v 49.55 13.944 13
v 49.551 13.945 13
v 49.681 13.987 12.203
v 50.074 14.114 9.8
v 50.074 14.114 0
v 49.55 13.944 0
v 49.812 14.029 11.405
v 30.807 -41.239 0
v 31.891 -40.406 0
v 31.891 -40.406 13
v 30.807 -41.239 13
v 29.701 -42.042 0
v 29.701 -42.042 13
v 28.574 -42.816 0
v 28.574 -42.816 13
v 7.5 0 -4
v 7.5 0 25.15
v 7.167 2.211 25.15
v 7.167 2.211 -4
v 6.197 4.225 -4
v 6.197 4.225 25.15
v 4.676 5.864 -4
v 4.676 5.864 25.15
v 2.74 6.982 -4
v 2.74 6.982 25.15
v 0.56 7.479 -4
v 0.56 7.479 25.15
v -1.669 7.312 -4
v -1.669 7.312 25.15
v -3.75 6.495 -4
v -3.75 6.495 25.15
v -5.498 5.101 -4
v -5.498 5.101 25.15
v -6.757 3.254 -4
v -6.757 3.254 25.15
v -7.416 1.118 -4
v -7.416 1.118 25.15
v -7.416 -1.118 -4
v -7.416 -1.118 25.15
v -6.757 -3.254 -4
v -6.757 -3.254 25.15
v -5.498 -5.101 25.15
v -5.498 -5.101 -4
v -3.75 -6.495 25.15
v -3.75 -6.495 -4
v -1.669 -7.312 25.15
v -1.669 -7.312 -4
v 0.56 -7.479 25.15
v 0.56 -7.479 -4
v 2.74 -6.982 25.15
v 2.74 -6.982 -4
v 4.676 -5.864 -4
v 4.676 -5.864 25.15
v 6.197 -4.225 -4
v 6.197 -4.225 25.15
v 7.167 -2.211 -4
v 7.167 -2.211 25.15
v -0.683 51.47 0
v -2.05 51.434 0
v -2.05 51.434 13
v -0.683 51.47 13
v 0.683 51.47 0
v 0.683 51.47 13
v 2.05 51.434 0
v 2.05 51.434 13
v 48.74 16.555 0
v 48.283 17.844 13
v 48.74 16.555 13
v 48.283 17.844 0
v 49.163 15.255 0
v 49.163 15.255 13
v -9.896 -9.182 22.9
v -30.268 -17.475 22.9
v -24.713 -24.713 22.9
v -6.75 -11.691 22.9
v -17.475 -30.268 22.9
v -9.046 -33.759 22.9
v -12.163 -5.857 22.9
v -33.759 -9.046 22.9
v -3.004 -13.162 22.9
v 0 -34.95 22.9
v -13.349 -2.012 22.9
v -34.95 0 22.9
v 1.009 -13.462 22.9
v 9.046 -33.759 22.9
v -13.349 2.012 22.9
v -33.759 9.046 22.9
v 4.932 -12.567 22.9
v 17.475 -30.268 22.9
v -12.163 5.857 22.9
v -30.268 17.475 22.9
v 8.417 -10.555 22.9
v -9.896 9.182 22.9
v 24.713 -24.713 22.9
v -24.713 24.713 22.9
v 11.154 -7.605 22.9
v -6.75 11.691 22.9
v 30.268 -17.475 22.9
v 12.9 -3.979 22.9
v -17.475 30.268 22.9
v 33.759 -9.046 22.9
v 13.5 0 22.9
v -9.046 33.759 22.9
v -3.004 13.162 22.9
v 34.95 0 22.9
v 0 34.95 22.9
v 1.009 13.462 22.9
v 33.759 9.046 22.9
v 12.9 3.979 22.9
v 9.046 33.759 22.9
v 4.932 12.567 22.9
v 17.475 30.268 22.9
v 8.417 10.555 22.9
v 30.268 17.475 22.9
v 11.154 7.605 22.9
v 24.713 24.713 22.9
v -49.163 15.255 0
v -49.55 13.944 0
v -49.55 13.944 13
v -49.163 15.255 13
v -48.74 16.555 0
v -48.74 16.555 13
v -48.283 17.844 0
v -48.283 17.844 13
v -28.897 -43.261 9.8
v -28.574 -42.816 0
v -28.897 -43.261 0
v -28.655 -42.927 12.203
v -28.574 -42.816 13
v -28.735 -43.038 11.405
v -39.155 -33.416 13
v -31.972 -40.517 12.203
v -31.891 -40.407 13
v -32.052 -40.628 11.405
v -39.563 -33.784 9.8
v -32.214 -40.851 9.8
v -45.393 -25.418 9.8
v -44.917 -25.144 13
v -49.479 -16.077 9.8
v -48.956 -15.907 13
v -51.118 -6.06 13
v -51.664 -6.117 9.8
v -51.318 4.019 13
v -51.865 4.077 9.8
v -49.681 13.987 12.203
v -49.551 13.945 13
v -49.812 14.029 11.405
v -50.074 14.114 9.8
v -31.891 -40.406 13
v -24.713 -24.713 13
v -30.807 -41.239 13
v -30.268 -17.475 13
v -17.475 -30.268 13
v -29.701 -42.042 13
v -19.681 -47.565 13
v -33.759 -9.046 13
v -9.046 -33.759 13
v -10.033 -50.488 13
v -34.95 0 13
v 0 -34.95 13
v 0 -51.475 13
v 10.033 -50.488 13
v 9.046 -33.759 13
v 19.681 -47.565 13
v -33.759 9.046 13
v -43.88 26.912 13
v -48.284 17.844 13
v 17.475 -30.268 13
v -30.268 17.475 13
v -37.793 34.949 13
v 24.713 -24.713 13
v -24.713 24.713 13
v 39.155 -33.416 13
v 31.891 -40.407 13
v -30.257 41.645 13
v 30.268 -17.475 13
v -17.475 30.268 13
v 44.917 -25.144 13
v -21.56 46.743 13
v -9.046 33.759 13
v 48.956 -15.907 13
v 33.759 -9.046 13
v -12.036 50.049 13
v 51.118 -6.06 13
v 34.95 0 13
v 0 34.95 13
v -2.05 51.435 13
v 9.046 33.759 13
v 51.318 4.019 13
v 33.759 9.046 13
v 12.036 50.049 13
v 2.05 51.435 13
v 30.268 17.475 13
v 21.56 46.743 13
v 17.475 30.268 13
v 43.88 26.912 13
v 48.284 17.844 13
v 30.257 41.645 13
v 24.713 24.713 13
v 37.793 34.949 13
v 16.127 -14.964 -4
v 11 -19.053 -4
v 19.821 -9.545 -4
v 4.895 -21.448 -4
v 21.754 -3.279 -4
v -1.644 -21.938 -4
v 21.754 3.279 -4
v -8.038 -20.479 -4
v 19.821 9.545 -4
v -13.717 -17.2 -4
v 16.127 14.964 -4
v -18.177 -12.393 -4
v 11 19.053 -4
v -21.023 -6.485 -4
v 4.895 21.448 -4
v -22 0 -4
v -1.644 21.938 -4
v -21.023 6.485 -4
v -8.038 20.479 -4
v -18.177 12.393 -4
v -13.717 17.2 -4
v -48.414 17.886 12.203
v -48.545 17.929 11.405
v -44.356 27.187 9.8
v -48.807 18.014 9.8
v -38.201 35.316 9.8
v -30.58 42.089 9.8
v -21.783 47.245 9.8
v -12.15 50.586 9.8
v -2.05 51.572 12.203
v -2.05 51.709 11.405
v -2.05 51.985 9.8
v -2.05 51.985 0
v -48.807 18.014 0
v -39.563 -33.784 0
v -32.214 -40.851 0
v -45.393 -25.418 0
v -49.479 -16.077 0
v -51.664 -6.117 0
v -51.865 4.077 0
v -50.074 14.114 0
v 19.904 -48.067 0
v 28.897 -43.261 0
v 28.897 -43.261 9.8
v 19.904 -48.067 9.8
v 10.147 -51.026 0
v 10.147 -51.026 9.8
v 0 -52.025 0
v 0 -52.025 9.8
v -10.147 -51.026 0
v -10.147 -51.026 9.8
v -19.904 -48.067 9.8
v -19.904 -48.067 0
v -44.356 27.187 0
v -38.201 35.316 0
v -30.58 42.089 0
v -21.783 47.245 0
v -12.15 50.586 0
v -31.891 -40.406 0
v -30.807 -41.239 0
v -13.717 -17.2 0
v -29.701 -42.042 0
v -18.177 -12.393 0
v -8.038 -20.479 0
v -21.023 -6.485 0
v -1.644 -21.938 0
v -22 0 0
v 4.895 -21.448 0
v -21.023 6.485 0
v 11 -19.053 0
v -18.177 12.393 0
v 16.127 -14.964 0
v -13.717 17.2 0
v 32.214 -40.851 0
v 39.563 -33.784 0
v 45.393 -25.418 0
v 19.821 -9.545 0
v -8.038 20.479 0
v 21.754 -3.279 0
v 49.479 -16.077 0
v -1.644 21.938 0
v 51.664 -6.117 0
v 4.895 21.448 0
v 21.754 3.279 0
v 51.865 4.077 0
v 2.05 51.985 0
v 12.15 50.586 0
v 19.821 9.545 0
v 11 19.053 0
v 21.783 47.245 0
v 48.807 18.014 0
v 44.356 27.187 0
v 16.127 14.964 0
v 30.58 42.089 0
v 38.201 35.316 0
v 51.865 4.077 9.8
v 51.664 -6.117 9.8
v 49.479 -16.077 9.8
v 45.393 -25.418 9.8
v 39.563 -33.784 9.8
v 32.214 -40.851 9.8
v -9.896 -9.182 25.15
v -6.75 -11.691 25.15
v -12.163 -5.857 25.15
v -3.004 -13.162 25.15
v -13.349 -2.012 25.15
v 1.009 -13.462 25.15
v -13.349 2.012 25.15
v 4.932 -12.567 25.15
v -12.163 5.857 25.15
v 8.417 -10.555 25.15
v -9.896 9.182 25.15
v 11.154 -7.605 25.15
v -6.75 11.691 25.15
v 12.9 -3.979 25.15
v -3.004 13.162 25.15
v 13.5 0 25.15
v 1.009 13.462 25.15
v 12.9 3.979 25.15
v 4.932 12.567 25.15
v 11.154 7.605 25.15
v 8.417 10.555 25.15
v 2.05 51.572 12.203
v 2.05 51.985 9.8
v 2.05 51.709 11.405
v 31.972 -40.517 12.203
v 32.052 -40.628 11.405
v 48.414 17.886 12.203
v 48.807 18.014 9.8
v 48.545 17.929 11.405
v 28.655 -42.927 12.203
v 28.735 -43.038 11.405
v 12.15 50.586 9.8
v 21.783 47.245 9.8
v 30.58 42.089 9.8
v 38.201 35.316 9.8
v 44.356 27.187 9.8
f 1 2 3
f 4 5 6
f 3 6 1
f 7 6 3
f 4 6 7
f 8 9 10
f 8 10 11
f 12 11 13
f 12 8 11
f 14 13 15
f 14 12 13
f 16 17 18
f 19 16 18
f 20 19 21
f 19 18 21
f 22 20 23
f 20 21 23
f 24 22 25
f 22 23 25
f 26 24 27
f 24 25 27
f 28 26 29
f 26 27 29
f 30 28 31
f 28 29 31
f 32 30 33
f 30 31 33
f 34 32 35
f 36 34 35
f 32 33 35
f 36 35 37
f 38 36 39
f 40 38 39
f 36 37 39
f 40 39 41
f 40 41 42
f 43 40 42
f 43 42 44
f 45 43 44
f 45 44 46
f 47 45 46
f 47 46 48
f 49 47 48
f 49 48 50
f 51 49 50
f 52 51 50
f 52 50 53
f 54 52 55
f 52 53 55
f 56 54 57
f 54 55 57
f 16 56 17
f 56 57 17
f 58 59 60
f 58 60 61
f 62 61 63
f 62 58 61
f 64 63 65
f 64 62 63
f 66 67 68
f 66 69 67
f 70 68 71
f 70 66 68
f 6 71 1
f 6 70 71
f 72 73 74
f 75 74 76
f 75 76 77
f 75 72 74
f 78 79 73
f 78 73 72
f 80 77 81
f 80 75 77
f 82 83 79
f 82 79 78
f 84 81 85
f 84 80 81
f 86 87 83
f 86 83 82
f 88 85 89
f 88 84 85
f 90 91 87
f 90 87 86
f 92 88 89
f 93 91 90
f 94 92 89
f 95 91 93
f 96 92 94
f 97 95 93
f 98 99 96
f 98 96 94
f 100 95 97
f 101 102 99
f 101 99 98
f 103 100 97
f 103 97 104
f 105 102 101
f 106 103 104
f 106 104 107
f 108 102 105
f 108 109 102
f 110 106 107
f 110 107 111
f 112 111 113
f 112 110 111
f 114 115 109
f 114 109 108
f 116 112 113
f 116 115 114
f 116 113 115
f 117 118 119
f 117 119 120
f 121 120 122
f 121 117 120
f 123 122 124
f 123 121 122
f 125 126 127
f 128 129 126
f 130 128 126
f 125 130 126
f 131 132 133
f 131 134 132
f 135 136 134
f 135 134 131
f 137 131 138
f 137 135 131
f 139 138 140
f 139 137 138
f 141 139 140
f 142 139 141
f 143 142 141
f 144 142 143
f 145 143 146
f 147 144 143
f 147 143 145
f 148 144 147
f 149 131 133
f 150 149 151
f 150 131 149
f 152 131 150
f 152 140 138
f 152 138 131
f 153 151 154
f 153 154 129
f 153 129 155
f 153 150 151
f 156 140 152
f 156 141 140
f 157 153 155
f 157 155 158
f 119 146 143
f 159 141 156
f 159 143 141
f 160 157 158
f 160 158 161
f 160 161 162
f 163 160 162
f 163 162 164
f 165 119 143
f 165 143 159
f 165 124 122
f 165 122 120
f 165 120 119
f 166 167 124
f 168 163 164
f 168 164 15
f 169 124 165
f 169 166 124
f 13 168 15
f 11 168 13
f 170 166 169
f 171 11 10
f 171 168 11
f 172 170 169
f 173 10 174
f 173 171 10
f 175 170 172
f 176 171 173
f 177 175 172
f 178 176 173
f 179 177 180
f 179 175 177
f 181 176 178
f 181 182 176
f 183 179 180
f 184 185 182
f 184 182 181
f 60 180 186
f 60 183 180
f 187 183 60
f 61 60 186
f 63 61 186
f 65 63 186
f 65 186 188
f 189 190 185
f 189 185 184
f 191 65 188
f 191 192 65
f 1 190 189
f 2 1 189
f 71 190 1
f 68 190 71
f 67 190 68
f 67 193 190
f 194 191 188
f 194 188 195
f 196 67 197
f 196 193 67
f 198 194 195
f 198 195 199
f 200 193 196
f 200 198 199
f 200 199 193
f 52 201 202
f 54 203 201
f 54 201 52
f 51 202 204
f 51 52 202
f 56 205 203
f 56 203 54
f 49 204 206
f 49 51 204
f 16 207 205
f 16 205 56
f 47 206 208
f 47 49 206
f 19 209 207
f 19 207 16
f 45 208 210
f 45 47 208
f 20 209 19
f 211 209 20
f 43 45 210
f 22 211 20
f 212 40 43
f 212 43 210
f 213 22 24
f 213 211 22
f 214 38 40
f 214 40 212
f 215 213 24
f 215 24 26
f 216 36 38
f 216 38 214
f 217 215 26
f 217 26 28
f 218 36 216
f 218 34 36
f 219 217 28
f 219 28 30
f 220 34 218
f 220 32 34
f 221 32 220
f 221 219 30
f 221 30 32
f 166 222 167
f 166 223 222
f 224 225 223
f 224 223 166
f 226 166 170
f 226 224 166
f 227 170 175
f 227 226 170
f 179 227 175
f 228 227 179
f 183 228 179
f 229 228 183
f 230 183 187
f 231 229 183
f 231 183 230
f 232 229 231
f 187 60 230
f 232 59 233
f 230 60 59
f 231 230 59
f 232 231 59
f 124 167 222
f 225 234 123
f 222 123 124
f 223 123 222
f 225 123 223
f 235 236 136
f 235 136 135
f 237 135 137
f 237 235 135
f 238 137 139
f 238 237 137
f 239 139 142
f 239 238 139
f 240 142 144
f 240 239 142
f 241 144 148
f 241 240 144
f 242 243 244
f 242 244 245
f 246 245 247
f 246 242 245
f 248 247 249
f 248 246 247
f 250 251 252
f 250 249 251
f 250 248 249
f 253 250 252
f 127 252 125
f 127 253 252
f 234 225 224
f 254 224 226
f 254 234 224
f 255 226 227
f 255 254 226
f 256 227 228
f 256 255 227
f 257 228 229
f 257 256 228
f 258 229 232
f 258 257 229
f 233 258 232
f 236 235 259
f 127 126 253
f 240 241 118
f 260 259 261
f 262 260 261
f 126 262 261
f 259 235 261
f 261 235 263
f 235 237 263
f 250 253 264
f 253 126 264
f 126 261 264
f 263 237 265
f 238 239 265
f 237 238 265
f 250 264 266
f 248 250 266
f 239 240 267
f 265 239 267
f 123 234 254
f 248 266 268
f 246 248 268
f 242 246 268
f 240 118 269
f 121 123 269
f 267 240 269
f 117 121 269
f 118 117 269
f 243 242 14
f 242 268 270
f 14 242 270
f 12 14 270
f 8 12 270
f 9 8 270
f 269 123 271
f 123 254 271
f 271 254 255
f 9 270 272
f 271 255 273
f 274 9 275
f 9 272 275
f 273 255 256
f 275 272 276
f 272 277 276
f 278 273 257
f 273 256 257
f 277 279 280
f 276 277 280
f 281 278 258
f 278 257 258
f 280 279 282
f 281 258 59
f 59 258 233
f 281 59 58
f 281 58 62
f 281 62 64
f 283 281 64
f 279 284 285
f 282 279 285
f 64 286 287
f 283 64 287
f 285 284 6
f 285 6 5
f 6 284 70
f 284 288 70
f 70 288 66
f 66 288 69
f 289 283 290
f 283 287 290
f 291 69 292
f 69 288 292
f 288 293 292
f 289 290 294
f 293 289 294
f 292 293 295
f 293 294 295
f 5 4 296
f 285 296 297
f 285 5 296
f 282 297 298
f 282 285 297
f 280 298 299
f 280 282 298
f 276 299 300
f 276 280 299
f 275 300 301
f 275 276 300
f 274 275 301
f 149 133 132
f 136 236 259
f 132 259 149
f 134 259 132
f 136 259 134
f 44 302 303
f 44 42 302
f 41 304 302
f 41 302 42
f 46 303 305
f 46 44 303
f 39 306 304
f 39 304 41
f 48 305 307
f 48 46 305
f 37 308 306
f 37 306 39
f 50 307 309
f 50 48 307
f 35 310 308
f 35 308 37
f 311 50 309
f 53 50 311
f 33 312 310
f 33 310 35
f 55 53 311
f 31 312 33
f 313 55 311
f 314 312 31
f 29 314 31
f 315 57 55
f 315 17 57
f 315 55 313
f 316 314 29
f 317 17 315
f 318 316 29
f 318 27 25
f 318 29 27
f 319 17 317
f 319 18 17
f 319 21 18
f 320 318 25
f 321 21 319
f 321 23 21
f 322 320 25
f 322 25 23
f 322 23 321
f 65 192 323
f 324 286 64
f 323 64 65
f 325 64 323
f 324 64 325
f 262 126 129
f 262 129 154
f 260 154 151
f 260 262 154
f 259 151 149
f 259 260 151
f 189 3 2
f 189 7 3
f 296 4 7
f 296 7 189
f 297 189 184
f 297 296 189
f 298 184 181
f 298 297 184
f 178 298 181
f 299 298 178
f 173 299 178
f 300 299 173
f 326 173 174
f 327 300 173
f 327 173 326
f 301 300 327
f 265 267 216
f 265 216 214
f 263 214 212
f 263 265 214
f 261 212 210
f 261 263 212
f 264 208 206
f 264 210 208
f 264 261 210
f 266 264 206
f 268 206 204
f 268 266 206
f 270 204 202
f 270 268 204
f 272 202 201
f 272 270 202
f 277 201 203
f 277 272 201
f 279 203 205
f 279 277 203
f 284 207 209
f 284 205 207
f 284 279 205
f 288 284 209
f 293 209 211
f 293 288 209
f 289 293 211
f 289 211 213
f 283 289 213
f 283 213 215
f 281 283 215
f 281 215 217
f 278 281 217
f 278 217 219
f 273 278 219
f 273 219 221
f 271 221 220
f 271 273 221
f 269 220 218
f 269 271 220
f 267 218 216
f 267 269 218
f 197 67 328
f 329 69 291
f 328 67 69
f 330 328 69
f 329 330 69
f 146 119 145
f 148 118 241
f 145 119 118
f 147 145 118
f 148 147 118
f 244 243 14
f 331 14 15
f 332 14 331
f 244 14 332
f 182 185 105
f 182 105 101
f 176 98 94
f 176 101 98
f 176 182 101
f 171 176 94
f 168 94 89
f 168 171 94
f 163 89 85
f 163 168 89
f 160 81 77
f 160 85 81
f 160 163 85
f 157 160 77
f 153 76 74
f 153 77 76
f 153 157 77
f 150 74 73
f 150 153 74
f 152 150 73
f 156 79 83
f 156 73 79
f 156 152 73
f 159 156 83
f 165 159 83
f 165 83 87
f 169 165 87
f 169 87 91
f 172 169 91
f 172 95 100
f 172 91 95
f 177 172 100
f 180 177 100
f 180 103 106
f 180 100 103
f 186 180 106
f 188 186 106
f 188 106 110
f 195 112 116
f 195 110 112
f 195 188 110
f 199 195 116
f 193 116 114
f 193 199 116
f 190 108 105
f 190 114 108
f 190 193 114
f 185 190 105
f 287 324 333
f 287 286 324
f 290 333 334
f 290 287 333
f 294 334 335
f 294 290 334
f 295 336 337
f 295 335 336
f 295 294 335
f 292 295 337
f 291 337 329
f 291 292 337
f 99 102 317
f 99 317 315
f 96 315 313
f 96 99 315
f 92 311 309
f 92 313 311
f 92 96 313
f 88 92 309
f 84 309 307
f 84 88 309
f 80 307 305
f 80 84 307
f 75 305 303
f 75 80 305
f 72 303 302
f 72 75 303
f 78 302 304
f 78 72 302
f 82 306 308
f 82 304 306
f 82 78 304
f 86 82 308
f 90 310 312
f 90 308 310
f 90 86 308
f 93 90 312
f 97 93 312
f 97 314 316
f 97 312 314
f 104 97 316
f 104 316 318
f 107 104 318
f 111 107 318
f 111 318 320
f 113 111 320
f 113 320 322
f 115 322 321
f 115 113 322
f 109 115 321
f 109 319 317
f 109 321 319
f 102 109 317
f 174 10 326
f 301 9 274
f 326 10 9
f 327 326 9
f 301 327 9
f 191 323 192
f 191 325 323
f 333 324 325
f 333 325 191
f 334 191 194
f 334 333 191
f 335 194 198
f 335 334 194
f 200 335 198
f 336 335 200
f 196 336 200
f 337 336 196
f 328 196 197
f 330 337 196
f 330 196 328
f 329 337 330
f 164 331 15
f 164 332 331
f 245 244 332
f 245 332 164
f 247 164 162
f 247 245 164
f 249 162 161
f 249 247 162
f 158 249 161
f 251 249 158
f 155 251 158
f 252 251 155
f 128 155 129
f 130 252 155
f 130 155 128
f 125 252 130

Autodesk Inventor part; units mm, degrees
ref_plane "YZ Plane" through (0, 0, 0) normal (1, 0, 0) x (0, 1, 0)
ref_plane "XZ Plane" through (0, 0, 0) normal (0, 1, 0) x (-1, 0, 0)
ref_plane "XY Plane" through (0, 0, 0) normal (0, 0, 1) x (1, 0, 0)
sketch "Sketch1" plane through (0, 0, 0) normal (0, 0, 1) x (1, 0, 0)
  circle A0 centre (0, 0) radius 52.025
  line L0 (-2.05, 56.1236) -> (2.05, 56.1236)
  line L1 (2.05, 56.1236) -> (2.05, 48.6562)
  line L2 (2.05, 48.6562) -> (-2.05, 48.6562)
  line L3 (-2.05, 48.6562) -> (-2.05, 56.1236)
  line L4 (0, 0) -> (0, 78.5962)
  circle A1 centre (0, 0) radius 51.475
  line L5 (-54.0102, 15.3935) -> (-52.7433, 19.2928)
  line L6 (-52.7433, 19.2928) -> (-45.6413, 16.9853)
  line L7 (-45.6413, 16.9853) -> (-46.9083, 13.0859)
  line L8 (-46.9083, 13.0859) -> (-54.0102, 15.3935)
  line L9 (-31.3302, -46.6099) -> (-34.6471, -44.2)
  line L10 (-34.6471, -44.2) -> (-30.2579, -38.1587)
  line L11 (-30.2579, -38.1587) -> (-26.9409, -40.5687)
  line L12 (-26.9409, -40.5687) -> (-31.3302, -46.6099)
  line L13 (34.6471, -44.2) -> (31.3302, -46.6099)
  line L14 (31.3302, -46.6099) -> (26.9409, -40.5687)
  line L15 (26.9409, -40.5687) -> (30.2579, -38.1587)
  line L16 (30.2579, -38.1587) -> (34.6471, -44.2)
  line L17 (52.7433, 19.2928) -> (54.0102, 15.3935)
  line L18 (54.0102, 15.3935) -> (46.9083, 13.0859)
  line L19 (46.9083, 13.0859) -> (45.6413, 16.9853)
  line L20 (45.6413, 16.9853) -> (52.7433, 19.2928)
  point P0 (2.05, 51.4342)
  point P1 (-2.05, 51.4342)
  point P2 (-2.05, 51.9846)
  point P3 (-48.8068, 18.0138)
  point P4 (-48.2833, 17.8437)
  point P5 (-49.5503, 13.9444)
  point P6 (-50.0738, 14.1145)
  point P7 (-32.2143, -40.8515)
  point P8 (-31.8907, -40.4062)
  point P9 (-28.5738, -42.8161)
  point P10 (-28.8973, -43.2614)
  point P11 (28.8973, -43.2614)
  point P12 (28.5738, -42.8161)
  point P13 (31.8907, -40.4062)
  point P14 (32.2143, -40.8515)
  point P15 (50.0738, 14.1145)
  point P16 (49.5503, 13.9444)
  point P17 (48.2833, 17.8437)
  point P18 (48.8068, 18.0138)
  point P19 (2.05, 51.9846)
  dimension "d0" = 104.05
  dimension "d2" = 0.55
  dimension "d3" = 2.05
  dimension "d4" = 4.1
  dimension "d7" = 360
extrude "Extrusion1" add sketch "Sketch1" along normal blind 13 contours A0 L16 A1 L18 | L20 A1 L1 A0 | L18 L19 L20 A1 | A1 L16 L15 L14 L12 L11 L10 L8 L7 L6 L3 L2 L1 L20 L19 L18 | A0 L12 A1 L14 | A1 L14 L15 L16 | L1 L2 L4 A1 | A0 L8 A1 L10 | A1 L10 L11 L12 | L3 A1 L6 A0 | L4 L2 L3 A1 | A1 L6 L7 L8
chamfer "Chamfer1" distance 0.55 distance2 3.2 5 edges at (49.4787, -16.0766, 13) (0, -52.025, 13) (-49.4787, -16.0766, 13) (-30.5795, 42.0891, 13) (30.5795, 42.0891, 13) measured on face at (-10.4211, -2.2799, 13)
sketch "Sketch2" plane through (0, 0, 0) normal (0, 0, -1) x (-1, 0, 0)
  circle A0 centre (0, 0) radius 22
  dimension "d14" = 44
extrude "Extrusion2" add sketch "Sketch2" along normal blind 4
sketch "Sketch3" plane through (0, 0, 13) normal (0, 0, 1) x (1, 0, 0)
  circle A0 centre (0, 0) radius 34.95
  dimension "d17" = 69.9
extrude "Extrusion3" add sketch "Sketch3" along normal blind 9.9
sketch "Sketch4" plane through (0, 0, 22.9) normal (0, 0, 1) x (1, 0, 0)
  circle A0 centre (0, 0) radius 13.5
  dimension "d20" = 27
extrude "Extrusion4" add sketch "Sketch4" along normal blind 2.25
sketch "Sketch5" plane through (0, 0, 25.15) normal (0, 0, 1) x (1, 0, 0)
  circle A0 centre (0, 0) radius 7.5
  dimension "d23" = 15
extrude "Extrusion5" cut sketch "Sketch5" against normal through all
properties part number "main_motor_planet" material "Aluminum 6061-AHC"
